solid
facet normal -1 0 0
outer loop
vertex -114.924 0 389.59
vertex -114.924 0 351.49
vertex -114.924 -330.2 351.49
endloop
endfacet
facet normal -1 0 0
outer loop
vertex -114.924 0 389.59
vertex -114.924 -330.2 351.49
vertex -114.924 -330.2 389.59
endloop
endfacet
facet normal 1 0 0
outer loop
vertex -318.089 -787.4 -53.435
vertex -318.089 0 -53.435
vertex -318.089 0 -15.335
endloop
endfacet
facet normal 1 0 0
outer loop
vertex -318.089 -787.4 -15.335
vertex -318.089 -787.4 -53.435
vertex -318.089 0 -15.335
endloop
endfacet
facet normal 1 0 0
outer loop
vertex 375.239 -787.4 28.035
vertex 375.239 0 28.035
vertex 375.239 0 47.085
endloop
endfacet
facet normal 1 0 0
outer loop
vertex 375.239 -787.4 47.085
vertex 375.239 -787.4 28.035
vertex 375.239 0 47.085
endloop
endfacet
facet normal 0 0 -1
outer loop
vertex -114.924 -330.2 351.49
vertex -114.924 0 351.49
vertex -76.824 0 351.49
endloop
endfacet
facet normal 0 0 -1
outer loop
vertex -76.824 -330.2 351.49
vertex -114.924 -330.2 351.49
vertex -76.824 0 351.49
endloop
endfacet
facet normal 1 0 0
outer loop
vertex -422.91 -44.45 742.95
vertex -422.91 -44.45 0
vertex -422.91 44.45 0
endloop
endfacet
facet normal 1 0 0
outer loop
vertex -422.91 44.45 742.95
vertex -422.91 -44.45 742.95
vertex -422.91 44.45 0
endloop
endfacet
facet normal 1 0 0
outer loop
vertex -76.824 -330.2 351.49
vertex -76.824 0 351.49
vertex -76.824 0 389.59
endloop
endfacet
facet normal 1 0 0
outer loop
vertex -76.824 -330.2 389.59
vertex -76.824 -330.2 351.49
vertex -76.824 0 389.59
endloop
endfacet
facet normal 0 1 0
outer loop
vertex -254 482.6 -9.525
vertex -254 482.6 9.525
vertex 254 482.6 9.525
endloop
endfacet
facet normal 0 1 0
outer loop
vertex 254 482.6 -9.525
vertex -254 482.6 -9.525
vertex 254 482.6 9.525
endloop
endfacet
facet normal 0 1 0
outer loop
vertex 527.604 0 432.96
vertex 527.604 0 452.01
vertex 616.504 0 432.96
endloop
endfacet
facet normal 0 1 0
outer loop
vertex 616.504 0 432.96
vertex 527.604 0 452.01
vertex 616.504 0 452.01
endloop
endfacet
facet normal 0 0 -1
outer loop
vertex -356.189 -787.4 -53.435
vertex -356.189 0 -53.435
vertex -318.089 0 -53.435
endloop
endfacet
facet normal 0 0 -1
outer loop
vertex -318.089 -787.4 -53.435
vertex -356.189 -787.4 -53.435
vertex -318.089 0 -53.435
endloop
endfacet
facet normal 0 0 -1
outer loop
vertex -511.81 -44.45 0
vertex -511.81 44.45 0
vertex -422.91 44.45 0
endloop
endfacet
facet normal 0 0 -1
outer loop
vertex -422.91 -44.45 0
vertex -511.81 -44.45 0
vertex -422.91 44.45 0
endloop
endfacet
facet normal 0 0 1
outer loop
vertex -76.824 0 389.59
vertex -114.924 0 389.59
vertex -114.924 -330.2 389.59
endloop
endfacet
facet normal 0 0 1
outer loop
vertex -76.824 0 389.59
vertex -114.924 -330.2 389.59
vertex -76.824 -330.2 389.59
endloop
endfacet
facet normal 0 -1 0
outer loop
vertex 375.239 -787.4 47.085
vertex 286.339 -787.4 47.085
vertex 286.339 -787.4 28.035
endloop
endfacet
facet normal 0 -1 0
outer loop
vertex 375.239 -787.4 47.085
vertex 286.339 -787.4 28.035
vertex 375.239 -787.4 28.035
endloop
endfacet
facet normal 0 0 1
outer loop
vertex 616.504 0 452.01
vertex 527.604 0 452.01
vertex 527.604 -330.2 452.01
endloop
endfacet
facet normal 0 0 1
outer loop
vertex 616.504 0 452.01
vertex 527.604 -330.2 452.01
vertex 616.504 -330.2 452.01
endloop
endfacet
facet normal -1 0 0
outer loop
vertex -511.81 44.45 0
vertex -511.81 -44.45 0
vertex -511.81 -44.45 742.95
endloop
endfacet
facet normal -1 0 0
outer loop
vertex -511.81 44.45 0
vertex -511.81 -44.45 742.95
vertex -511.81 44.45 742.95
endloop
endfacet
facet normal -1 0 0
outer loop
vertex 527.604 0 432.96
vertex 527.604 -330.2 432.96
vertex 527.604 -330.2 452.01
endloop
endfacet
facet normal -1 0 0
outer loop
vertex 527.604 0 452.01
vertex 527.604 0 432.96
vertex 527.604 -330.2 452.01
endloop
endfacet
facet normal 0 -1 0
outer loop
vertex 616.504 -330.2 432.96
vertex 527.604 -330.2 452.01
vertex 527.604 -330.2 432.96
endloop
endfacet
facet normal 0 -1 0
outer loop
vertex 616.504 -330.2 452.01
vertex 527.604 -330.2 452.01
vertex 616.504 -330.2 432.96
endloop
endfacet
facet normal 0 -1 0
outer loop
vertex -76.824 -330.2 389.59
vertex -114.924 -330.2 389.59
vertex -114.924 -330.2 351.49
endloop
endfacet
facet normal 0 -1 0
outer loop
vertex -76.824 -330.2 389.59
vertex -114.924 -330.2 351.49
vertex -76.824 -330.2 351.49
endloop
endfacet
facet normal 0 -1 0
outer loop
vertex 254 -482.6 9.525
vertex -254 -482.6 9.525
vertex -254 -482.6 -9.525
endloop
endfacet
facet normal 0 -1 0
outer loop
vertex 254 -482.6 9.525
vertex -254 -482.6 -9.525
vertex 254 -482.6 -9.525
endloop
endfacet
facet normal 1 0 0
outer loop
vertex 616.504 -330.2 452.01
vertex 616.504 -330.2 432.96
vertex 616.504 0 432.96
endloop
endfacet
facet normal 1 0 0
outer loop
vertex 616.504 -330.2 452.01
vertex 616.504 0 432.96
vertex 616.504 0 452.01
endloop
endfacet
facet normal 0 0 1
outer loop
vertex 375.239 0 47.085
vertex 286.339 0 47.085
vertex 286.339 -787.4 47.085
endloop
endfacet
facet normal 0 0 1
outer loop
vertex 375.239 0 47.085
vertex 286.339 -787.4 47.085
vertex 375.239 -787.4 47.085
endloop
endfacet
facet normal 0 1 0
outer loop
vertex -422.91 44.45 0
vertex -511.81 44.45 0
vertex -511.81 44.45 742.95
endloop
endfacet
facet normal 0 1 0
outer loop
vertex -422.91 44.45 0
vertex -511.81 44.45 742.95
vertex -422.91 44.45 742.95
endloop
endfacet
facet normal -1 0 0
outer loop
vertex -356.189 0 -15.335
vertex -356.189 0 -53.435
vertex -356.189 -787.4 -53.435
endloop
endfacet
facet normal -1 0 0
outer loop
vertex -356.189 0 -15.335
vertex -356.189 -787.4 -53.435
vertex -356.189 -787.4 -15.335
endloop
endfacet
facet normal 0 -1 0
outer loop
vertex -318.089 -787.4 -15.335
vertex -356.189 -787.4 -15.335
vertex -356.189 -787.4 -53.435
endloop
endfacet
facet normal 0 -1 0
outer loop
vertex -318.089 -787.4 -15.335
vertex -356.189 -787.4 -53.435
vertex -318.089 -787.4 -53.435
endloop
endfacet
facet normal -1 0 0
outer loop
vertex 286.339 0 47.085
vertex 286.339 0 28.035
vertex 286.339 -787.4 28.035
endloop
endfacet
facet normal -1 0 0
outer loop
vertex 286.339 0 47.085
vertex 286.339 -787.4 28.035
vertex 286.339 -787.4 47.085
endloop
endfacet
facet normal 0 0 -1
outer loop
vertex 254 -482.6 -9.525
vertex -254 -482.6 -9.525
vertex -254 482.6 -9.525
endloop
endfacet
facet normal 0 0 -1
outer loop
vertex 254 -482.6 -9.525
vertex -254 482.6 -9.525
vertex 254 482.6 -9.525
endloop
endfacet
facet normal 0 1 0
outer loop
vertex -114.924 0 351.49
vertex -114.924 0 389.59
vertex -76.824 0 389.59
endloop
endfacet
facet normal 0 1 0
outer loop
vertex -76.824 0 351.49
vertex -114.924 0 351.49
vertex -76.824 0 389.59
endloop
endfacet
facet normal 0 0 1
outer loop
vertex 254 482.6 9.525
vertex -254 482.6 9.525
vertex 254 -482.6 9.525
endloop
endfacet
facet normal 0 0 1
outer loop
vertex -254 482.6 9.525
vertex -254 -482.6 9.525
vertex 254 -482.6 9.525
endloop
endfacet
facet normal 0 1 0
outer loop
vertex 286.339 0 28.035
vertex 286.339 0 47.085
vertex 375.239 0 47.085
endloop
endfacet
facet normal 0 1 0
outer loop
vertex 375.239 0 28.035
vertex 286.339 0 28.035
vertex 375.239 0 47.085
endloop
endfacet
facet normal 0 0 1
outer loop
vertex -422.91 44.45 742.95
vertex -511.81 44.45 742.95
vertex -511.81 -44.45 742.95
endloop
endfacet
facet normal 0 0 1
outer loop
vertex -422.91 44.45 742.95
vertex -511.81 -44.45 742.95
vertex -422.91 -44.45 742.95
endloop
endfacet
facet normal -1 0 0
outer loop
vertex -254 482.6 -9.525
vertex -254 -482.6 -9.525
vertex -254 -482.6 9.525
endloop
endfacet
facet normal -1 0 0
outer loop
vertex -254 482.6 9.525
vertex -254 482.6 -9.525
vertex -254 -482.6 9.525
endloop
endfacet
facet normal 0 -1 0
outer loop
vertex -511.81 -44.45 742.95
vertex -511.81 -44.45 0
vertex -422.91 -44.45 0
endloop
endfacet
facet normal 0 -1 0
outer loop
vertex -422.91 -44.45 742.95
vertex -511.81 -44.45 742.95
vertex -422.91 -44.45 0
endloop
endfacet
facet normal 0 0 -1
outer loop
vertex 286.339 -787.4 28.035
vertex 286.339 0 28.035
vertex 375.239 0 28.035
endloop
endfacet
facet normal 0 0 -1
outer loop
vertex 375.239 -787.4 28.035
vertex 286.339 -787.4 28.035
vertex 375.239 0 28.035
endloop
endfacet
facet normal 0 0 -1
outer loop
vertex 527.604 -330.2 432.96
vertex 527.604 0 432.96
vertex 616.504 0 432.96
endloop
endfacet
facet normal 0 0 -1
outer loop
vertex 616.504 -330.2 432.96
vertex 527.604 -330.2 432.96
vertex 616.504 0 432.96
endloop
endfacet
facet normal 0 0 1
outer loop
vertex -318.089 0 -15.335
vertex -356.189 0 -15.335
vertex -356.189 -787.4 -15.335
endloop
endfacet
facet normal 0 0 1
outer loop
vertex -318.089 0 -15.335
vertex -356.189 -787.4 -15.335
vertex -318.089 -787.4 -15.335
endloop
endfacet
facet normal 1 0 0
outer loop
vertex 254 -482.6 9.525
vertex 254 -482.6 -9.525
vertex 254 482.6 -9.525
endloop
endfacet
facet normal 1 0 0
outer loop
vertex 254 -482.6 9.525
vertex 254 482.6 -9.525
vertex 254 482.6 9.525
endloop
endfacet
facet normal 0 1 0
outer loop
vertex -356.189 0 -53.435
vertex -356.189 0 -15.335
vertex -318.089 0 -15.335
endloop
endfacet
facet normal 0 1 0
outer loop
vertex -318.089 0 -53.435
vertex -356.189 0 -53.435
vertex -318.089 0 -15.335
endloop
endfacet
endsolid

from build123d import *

# Parameters (mm, degrees)
F0_W          = 508
F0_H          = 19.05
F1_DEPTH      = 482.6
F1_DEPTH_BACK = 482.6
F2_W          = 88.9
F2_H          = 88.9
F3_DEPTH      = 742.95
F4_W          = 88.9
F4_H          = 19.05
F4_W_2        = 38.1
F4_H_2        = 38.1
F5_DEPTH      = 330.2
F6_W          = 38.1
F6_H          = 38.1
F6_W_2        = 88.9
F6_H_2        = 19.05
F7_DEPTH      = 787.4


with BuildPart() as f1:
    # F0 (on Front) → F1 (new body, two sides)
    with BuildSketch(Plane.XZ) as f1_sk:
        Rectangle(F0_W, F0_H)
    extrude(amount=F1_DEPTH)
    extrude(f1_sk.sketch, amount=-F1_DEPTH_BACK)


with BuildPart() as f3:
    # F2 (on Top) → F3 (new body)
    with BuildSketch(Plane.XY):
        with Locations((-467.359938, 0)):
            Rectangle(F2_W, F2_H)
    extrude(amount=F3_DEPTH)


with BuildPart() as f5:
    # F4 (on Front) → F5 (new body)
    with BuildSketch(Plane.XZ):
        with Locations((572.053994, 442.484648)):
            Rectangle(F4_W, F4_H)
        with Locations((-95.87417, 370.540144)):
            Rectangle(F4_W_2, F4_H_2)
    extrude(amount=F5_DEPTH)


with BuildPart() as f7:
    # F6 (on Front) → F7 (new body)
    with BuildSketch(Plane.XZ):
        with Locations((-337.139082, -34.384752)):
            Rectangle(F6_W, F6_H)
        with Locations((330.789082, 37.559752)):
            Rectangle(F6_W_2, F6_H_2)
    extrude(amount=F7_DEPTH)


solid = Compound([f1.part, f3.part, f5.part, f7.part])
